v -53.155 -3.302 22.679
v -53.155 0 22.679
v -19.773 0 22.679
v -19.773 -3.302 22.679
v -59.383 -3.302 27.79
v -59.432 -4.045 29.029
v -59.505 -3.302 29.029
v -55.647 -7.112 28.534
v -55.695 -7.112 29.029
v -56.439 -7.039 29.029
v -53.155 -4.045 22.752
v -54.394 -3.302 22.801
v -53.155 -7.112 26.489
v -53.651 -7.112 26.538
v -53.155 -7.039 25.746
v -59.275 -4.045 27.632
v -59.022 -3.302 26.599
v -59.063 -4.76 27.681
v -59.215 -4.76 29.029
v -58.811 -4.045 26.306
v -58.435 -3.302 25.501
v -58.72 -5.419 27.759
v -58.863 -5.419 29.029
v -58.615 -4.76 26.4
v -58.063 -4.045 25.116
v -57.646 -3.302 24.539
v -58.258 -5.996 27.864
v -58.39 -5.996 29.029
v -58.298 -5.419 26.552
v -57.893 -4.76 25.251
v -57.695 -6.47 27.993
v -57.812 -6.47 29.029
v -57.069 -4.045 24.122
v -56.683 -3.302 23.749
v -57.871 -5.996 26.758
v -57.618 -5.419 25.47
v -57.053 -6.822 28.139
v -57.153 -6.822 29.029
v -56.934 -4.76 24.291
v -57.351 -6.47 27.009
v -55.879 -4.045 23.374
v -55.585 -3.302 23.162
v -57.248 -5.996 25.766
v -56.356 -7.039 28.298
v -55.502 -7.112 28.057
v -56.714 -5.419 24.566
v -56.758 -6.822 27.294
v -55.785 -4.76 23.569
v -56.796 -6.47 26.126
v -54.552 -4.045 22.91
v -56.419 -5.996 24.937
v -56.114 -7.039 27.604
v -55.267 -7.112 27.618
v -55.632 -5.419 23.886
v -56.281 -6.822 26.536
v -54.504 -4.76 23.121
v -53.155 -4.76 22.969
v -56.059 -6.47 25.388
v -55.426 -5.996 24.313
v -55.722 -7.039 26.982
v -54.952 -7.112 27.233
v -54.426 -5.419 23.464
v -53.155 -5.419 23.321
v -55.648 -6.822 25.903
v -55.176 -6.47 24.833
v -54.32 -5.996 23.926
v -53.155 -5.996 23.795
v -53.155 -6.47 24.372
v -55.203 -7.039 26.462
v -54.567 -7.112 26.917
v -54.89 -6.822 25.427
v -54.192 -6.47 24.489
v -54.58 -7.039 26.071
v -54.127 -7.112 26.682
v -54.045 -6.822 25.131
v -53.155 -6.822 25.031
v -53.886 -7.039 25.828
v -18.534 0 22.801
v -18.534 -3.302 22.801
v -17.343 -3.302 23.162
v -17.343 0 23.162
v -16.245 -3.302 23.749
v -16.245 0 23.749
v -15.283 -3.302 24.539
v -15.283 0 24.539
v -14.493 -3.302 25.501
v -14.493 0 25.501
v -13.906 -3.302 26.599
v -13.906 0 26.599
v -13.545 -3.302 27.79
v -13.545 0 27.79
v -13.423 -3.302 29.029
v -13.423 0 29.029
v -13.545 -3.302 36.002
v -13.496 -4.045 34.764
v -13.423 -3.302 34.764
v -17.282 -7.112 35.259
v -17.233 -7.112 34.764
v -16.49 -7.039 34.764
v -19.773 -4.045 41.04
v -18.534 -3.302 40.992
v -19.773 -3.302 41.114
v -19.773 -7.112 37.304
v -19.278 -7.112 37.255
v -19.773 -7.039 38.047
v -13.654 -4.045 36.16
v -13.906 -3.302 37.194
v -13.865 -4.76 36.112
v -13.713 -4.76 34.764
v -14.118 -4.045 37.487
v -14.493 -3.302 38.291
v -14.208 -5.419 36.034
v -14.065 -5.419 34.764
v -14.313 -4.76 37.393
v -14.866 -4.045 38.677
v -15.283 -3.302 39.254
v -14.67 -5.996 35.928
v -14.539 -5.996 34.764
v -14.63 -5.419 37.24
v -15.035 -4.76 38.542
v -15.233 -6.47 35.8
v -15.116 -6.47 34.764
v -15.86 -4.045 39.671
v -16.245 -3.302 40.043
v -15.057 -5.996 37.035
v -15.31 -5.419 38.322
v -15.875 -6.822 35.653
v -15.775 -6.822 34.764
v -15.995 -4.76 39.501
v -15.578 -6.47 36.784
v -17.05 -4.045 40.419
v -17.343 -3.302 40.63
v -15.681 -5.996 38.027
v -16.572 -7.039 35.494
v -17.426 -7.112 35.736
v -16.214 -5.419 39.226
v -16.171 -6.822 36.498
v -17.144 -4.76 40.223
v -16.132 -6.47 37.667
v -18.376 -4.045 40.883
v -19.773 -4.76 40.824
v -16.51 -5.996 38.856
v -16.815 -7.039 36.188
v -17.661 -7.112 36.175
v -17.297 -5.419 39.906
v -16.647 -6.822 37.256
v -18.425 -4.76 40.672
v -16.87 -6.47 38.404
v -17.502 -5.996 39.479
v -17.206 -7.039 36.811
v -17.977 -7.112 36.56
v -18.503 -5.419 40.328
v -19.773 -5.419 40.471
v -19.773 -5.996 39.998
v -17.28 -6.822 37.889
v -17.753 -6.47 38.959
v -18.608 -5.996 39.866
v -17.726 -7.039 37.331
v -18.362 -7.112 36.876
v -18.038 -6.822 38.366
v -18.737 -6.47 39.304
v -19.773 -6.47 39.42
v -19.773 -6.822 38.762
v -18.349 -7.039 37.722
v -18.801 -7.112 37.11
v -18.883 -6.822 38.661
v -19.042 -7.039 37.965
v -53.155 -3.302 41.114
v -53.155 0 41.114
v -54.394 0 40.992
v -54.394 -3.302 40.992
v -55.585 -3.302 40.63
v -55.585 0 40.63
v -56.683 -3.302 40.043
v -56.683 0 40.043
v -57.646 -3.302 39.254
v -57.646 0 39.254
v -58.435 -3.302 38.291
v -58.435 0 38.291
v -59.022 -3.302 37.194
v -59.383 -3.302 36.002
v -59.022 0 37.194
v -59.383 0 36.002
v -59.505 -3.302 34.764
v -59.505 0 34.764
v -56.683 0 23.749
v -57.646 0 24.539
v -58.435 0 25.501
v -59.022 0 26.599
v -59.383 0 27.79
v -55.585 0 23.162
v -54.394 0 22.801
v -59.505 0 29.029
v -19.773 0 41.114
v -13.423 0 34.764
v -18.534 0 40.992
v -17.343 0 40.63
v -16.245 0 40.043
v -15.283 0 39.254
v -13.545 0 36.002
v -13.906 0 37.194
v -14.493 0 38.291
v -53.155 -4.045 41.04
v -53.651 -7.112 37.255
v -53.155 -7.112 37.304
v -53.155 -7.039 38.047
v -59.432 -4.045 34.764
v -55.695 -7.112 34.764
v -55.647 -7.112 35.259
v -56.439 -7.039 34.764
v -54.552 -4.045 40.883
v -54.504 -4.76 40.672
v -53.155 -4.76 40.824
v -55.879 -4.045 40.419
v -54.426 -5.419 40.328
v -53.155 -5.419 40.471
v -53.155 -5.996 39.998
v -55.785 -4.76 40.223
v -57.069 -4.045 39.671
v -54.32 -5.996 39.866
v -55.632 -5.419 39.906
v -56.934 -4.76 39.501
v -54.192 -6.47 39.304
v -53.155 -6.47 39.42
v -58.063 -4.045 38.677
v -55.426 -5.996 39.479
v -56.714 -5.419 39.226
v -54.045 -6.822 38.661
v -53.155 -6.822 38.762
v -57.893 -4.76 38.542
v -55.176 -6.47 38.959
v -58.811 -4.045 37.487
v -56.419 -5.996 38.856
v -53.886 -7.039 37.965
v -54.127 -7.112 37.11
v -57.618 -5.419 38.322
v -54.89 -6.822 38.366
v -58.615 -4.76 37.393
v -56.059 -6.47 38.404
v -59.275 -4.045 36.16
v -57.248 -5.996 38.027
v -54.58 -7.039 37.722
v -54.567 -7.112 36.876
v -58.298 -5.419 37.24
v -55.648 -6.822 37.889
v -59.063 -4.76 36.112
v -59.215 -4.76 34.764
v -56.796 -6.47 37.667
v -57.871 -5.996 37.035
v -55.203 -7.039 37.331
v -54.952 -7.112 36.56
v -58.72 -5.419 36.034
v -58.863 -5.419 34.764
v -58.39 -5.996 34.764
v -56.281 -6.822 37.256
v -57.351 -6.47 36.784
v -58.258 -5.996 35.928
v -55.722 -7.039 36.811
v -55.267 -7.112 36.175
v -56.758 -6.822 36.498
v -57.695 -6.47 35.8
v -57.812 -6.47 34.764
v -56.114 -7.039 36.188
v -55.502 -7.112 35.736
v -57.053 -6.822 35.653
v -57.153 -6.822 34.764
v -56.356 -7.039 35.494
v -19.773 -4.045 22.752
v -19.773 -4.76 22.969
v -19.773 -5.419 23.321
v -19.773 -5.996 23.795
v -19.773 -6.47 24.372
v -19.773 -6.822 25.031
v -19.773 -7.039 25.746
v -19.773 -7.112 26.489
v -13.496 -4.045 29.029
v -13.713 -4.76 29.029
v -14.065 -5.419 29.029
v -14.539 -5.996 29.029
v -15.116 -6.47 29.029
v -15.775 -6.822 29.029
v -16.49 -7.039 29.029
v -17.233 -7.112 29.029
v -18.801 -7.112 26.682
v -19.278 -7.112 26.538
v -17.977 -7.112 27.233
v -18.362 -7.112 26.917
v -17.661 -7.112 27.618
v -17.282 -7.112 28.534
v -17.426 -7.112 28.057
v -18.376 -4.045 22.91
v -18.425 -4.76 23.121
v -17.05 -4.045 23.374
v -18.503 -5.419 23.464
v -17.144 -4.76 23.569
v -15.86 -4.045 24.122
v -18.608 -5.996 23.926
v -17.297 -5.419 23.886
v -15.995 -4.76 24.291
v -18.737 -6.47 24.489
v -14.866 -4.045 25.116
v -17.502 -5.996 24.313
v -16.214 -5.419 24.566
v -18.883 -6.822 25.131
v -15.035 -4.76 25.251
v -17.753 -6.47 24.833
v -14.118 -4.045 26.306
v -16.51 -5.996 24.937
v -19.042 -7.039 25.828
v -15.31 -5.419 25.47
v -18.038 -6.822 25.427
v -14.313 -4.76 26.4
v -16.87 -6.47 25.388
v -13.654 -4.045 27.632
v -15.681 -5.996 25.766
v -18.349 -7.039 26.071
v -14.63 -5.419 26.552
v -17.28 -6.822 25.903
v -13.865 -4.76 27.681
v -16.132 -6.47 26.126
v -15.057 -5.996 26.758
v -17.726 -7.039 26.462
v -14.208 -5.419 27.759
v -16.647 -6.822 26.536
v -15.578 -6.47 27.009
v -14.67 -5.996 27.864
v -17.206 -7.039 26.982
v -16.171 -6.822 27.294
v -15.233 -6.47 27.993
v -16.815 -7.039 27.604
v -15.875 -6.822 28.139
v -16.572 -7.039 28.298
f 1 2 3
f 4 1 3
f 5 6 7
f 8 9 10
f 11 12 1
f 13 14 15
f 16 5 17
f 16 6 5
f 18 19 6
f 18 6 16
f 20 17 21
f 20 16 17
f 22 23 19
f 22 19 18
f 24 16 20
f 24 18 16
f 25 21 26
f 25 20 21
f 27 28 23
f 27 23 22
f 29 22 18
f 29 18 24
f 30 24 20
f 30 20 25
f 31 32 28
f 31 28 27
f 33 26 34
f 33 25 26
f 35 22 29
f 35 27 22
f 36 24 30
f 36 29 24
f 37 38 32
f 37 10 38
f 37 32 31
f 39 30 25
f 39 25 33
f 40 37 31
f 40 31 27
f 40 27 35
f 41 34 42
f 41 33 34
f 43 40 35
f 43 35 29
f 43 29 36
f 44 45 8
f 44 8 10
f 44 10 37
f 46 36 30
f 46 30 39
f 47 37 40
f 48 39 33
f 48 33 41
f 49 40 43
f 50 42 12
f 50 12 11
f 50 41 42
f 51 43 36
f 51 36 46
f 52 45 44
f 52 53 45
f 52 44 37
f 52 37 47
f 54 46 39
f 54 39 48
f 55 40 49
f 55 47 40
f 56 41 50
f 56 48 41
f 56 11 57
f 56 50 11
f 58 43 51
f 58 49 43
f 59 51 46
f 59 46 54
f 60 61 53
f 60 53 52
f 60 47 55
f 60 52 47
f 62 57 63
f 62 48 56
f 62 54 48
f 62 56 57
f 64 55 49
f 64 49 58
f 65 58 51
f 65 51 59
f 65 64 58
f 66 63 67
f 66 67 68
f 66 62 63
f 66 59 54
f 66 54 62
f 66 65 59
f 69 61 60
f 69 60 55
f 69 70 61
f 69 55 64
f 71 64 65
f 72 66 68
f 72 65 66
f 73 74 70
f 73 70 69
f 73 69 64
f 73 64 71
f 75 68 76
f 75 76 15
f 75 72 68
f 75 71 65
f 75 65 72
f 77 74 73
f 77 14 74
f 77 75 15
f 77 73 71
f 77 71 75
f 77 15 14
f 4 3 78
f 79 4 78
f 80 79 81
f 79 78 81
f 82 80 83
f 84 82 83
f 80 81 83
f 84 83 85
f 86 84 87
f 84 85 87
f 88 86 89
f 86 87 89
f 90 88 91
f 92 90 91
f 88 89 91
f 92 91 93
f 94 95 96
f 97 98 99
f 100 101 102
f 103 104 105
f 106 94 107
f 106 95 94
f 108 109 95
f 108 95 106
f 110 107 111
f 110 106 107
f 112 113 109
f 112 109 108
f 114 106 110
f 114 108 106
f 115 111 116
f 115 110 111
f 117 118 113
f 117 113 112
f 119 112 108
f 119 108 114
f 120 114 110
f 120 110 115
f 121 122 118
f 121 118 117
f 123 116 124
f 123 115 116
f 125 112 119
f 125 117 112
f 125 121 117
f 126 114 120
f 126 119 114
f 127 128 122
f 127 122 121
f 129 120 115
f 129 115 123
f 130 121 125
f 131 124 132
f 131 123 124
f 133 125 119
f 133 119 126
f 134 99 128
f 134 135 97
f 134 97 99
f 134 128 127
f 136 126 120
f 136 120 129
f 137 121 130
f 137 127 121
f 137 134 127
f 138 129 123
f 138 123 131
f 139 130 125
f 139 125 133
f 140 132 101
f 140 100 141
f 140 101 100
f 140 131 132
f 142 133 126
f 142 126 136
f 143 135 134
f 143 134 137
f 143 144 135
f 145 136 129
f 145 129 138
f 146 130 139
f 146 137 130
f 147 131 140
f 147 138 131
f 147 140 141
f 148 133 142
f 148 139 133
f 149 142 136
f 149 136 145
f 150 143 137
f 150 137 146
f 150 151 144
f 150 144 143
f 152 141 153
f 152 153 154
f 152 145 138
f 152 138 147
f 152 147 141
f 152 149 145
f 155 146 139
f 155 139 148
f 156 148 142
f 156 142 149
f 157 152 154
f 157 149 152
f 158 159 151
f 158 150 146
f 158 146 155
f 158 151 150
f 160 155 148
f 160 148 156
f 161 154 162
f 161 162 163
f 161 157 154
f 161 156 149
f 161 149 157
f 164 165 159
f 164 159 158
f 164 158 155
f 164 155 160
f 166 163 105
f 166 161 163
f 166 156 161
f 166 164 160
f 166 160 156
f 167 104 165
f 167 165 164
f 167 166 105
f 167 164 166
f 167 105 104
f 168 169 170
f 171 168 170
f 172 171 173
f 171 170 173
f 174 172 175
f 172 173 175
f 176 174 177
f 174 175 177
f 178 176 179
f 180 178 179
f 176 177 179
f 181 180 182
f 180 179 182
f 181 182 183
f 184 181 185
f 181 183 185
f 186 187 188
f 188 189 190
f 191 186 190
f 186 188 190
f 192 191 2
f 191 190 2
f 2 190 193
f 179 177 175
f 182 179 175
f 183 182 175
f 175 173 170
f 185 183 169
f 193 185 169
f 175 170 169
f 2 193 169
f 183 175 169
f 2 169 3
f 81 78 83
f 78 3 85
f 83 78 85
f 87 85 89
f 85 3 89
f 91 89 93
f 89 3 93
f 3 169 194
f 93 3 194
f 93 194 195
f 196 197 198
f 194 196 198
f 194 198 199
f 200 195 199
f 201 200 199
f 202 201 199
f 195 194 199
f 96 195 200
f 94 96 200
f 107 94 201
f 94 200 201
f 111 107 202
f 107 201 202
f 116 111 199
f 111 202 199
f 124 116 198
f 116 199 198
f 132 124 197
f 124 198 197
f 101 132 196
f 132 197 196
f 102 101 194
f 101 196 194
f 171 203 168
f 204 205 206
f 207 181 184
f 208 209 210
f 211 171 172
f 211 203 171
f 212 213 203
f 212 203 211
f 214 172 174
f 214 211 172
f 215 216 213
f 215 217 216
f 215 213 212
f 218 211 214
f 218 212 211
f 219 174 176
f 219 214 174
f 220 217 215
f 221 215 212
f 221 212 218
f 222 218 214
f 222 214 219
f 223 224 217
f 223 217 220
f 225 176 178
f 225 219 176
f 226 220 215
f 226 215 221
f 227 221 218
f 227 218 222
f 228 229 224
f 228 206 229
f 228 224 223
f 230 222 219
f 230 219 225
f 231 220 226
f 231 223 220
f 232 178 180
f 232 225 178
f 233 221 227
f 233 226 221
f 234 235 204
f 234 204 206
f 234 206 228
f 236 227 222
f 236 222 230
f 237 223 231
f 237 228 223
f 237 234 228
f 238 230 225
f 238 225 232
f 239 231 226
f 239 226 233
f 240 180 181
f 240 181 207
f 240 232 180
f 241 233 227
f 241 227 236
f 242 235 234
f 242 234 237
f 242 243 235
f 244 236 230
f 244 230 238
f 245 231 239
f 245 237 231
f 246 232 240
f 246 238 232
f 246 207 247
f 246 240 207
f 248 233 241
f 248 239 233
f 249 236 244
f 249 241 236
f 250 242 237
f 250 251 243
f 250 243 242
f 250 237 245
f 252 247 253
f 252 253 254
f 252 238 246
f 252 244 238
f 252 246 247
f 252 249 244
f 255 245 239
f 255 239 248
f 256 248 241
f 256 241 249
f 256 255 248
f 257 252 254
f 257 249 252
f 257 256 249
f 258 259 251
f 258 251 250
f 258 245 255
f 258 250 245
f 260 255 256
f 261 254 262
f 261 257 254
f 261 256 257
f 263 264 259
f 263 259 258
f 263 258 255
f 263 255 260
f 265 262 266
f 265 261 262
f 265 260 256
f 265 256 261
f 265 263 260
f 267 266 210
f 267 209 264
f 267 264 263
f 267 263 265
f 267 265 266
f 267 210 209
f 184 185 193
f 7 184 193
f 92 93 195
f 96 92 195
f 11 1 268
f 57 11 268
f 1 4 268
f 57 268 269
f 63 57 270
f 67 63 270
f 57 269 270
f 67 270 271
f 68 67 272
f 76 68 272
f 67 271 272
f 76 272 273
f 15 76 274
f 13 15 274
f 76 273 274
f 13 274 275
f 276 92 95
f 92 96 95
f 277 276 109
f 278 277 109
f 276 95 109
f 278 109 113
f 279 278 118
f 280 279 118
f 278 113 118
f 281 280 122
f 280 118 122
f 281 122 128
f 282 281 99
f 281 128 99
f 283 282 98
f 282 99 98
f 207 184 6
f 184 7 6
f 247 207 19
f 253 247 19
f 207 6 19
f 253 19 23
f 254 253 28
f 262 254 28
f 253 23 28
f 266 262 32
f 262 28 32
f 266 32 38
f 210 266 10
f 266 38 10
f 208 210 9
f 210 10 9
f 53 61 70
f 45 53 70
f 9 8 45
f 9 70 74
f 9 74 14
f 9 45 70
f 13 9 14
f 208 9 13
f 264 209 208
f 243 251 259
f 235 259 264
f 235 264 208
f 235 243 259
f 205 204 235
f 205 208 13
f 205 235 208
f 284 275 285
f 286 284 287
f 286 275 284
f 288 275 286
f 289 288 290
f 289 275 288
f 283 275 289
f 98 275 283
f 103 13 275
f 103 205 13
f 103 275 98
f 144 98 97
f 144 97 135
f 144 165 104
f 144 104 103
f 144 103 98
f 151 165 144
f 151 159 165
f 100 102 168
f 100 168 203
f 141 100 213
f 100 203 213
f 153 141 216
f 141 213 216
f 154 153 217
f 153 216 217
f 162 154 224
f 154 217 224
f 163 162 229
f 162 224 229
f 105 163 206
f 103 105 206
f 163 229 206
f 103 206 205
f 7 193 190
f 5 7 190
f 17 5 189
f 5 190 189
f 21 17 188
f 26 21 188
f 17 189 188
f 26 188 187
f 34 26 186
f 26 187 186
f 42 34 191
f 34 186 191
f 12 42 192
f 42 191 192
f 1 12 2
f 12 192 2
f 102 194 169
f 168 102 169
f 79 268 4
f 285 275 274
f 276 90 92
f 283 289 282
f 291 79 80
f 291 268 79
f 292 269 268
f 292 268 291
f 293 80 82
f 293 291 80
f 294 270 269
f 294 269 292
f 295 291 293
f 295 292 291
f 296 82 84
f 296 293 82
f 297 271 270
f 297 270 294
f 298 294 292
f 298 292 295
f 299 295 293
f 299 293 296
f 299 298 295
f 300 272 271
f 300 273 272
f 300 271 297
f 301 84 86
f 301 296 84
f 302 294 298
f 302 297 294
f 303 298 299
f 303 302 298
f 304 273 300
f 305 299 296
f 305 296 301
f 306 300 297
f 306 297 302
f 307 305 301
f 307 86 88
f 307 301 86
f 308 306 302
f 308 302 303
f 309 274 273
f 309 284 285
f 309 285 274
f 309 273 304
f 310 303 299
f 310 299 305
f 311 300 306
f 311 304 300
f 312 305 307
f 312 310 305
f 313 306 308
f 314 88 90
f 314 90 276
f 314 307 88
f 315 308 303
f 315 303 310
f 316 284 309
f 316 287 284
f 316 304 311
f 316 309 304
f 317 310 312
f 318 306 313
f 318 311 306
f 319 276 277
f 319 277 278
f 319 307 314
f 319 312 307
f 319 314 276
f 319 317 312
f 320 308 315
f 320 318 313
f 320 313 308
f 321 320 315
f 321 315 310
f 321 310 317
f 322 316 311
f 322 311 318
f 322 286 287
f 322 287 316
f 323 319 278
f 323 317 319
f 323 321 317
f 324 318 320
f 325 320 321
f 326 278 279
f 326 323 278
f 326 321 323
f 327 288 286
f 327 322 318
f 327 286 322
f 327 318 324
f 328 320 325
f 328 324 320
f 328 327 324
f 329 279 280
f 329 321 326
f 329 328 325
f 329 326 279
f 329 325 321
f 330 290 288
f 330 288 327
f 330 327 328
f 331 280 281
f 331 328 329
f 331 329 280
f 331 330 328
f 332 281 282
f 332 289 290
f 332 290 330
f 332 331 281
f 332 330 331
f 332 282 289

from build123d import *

# Parameters (mm, degrees)
F1_DEPTH = 7.112
F2_R     = 3.81


with BuildPart() as f1:
    # F0 (on Front) → F1 (new body)
    with BuildSketch(Plane.XZ):
        with BuildLine():
            Line((-19.773078, 41.113582), (-53.155455, 41.113582))
            ThreePointArc((-53.155455, 41.113582), (-57.645583, 39.25371), (-59.505455, 34.763582))
            Line((-59.505455, 34.763582), (-59.505455, 29.029039))
            ThreePointArc((-59.505455, 29.029039), (-57.645583, 24.53891), (-53.155455, 22.679039))
            Line((-53.155455, 22.679039), (-19.773078, 22.679039))
            ThreePointArc((-19.773078, 22.679039), (-15.28295, 24.53891), (-13.423078, 29.029039))
            Line((-13.423078, 29.029039), (-13.423078, 34.763582))
            ThreePointArc((-13.423078, 34.763582), (-15.28295, 39.25371), (-19.773078, 41.113582))
        make_face()
    extrude(amount=F1_DEPTH)

    # F2
    f2_edges = [f1.edges().sort_by_distance(p)[0] for p in [
        (-13.423078, -7.112, 31.89631),
        (-15.28295, -7.112, 39.25371),
        (-36.464266, -7.112, 41.113582),
        (-57.645583, -7.112, 39.25371),
        (-59.505455, -7.112, 31.89631),
        (-57.645583, -7.112, 24.53891),
        (-36.464266, -7.112, 22.679039),
        (-15.28295, -7.112, 24.53891),
    ]]
    fillet(f2_edges, radius=F2_R)


solid = f1.part
